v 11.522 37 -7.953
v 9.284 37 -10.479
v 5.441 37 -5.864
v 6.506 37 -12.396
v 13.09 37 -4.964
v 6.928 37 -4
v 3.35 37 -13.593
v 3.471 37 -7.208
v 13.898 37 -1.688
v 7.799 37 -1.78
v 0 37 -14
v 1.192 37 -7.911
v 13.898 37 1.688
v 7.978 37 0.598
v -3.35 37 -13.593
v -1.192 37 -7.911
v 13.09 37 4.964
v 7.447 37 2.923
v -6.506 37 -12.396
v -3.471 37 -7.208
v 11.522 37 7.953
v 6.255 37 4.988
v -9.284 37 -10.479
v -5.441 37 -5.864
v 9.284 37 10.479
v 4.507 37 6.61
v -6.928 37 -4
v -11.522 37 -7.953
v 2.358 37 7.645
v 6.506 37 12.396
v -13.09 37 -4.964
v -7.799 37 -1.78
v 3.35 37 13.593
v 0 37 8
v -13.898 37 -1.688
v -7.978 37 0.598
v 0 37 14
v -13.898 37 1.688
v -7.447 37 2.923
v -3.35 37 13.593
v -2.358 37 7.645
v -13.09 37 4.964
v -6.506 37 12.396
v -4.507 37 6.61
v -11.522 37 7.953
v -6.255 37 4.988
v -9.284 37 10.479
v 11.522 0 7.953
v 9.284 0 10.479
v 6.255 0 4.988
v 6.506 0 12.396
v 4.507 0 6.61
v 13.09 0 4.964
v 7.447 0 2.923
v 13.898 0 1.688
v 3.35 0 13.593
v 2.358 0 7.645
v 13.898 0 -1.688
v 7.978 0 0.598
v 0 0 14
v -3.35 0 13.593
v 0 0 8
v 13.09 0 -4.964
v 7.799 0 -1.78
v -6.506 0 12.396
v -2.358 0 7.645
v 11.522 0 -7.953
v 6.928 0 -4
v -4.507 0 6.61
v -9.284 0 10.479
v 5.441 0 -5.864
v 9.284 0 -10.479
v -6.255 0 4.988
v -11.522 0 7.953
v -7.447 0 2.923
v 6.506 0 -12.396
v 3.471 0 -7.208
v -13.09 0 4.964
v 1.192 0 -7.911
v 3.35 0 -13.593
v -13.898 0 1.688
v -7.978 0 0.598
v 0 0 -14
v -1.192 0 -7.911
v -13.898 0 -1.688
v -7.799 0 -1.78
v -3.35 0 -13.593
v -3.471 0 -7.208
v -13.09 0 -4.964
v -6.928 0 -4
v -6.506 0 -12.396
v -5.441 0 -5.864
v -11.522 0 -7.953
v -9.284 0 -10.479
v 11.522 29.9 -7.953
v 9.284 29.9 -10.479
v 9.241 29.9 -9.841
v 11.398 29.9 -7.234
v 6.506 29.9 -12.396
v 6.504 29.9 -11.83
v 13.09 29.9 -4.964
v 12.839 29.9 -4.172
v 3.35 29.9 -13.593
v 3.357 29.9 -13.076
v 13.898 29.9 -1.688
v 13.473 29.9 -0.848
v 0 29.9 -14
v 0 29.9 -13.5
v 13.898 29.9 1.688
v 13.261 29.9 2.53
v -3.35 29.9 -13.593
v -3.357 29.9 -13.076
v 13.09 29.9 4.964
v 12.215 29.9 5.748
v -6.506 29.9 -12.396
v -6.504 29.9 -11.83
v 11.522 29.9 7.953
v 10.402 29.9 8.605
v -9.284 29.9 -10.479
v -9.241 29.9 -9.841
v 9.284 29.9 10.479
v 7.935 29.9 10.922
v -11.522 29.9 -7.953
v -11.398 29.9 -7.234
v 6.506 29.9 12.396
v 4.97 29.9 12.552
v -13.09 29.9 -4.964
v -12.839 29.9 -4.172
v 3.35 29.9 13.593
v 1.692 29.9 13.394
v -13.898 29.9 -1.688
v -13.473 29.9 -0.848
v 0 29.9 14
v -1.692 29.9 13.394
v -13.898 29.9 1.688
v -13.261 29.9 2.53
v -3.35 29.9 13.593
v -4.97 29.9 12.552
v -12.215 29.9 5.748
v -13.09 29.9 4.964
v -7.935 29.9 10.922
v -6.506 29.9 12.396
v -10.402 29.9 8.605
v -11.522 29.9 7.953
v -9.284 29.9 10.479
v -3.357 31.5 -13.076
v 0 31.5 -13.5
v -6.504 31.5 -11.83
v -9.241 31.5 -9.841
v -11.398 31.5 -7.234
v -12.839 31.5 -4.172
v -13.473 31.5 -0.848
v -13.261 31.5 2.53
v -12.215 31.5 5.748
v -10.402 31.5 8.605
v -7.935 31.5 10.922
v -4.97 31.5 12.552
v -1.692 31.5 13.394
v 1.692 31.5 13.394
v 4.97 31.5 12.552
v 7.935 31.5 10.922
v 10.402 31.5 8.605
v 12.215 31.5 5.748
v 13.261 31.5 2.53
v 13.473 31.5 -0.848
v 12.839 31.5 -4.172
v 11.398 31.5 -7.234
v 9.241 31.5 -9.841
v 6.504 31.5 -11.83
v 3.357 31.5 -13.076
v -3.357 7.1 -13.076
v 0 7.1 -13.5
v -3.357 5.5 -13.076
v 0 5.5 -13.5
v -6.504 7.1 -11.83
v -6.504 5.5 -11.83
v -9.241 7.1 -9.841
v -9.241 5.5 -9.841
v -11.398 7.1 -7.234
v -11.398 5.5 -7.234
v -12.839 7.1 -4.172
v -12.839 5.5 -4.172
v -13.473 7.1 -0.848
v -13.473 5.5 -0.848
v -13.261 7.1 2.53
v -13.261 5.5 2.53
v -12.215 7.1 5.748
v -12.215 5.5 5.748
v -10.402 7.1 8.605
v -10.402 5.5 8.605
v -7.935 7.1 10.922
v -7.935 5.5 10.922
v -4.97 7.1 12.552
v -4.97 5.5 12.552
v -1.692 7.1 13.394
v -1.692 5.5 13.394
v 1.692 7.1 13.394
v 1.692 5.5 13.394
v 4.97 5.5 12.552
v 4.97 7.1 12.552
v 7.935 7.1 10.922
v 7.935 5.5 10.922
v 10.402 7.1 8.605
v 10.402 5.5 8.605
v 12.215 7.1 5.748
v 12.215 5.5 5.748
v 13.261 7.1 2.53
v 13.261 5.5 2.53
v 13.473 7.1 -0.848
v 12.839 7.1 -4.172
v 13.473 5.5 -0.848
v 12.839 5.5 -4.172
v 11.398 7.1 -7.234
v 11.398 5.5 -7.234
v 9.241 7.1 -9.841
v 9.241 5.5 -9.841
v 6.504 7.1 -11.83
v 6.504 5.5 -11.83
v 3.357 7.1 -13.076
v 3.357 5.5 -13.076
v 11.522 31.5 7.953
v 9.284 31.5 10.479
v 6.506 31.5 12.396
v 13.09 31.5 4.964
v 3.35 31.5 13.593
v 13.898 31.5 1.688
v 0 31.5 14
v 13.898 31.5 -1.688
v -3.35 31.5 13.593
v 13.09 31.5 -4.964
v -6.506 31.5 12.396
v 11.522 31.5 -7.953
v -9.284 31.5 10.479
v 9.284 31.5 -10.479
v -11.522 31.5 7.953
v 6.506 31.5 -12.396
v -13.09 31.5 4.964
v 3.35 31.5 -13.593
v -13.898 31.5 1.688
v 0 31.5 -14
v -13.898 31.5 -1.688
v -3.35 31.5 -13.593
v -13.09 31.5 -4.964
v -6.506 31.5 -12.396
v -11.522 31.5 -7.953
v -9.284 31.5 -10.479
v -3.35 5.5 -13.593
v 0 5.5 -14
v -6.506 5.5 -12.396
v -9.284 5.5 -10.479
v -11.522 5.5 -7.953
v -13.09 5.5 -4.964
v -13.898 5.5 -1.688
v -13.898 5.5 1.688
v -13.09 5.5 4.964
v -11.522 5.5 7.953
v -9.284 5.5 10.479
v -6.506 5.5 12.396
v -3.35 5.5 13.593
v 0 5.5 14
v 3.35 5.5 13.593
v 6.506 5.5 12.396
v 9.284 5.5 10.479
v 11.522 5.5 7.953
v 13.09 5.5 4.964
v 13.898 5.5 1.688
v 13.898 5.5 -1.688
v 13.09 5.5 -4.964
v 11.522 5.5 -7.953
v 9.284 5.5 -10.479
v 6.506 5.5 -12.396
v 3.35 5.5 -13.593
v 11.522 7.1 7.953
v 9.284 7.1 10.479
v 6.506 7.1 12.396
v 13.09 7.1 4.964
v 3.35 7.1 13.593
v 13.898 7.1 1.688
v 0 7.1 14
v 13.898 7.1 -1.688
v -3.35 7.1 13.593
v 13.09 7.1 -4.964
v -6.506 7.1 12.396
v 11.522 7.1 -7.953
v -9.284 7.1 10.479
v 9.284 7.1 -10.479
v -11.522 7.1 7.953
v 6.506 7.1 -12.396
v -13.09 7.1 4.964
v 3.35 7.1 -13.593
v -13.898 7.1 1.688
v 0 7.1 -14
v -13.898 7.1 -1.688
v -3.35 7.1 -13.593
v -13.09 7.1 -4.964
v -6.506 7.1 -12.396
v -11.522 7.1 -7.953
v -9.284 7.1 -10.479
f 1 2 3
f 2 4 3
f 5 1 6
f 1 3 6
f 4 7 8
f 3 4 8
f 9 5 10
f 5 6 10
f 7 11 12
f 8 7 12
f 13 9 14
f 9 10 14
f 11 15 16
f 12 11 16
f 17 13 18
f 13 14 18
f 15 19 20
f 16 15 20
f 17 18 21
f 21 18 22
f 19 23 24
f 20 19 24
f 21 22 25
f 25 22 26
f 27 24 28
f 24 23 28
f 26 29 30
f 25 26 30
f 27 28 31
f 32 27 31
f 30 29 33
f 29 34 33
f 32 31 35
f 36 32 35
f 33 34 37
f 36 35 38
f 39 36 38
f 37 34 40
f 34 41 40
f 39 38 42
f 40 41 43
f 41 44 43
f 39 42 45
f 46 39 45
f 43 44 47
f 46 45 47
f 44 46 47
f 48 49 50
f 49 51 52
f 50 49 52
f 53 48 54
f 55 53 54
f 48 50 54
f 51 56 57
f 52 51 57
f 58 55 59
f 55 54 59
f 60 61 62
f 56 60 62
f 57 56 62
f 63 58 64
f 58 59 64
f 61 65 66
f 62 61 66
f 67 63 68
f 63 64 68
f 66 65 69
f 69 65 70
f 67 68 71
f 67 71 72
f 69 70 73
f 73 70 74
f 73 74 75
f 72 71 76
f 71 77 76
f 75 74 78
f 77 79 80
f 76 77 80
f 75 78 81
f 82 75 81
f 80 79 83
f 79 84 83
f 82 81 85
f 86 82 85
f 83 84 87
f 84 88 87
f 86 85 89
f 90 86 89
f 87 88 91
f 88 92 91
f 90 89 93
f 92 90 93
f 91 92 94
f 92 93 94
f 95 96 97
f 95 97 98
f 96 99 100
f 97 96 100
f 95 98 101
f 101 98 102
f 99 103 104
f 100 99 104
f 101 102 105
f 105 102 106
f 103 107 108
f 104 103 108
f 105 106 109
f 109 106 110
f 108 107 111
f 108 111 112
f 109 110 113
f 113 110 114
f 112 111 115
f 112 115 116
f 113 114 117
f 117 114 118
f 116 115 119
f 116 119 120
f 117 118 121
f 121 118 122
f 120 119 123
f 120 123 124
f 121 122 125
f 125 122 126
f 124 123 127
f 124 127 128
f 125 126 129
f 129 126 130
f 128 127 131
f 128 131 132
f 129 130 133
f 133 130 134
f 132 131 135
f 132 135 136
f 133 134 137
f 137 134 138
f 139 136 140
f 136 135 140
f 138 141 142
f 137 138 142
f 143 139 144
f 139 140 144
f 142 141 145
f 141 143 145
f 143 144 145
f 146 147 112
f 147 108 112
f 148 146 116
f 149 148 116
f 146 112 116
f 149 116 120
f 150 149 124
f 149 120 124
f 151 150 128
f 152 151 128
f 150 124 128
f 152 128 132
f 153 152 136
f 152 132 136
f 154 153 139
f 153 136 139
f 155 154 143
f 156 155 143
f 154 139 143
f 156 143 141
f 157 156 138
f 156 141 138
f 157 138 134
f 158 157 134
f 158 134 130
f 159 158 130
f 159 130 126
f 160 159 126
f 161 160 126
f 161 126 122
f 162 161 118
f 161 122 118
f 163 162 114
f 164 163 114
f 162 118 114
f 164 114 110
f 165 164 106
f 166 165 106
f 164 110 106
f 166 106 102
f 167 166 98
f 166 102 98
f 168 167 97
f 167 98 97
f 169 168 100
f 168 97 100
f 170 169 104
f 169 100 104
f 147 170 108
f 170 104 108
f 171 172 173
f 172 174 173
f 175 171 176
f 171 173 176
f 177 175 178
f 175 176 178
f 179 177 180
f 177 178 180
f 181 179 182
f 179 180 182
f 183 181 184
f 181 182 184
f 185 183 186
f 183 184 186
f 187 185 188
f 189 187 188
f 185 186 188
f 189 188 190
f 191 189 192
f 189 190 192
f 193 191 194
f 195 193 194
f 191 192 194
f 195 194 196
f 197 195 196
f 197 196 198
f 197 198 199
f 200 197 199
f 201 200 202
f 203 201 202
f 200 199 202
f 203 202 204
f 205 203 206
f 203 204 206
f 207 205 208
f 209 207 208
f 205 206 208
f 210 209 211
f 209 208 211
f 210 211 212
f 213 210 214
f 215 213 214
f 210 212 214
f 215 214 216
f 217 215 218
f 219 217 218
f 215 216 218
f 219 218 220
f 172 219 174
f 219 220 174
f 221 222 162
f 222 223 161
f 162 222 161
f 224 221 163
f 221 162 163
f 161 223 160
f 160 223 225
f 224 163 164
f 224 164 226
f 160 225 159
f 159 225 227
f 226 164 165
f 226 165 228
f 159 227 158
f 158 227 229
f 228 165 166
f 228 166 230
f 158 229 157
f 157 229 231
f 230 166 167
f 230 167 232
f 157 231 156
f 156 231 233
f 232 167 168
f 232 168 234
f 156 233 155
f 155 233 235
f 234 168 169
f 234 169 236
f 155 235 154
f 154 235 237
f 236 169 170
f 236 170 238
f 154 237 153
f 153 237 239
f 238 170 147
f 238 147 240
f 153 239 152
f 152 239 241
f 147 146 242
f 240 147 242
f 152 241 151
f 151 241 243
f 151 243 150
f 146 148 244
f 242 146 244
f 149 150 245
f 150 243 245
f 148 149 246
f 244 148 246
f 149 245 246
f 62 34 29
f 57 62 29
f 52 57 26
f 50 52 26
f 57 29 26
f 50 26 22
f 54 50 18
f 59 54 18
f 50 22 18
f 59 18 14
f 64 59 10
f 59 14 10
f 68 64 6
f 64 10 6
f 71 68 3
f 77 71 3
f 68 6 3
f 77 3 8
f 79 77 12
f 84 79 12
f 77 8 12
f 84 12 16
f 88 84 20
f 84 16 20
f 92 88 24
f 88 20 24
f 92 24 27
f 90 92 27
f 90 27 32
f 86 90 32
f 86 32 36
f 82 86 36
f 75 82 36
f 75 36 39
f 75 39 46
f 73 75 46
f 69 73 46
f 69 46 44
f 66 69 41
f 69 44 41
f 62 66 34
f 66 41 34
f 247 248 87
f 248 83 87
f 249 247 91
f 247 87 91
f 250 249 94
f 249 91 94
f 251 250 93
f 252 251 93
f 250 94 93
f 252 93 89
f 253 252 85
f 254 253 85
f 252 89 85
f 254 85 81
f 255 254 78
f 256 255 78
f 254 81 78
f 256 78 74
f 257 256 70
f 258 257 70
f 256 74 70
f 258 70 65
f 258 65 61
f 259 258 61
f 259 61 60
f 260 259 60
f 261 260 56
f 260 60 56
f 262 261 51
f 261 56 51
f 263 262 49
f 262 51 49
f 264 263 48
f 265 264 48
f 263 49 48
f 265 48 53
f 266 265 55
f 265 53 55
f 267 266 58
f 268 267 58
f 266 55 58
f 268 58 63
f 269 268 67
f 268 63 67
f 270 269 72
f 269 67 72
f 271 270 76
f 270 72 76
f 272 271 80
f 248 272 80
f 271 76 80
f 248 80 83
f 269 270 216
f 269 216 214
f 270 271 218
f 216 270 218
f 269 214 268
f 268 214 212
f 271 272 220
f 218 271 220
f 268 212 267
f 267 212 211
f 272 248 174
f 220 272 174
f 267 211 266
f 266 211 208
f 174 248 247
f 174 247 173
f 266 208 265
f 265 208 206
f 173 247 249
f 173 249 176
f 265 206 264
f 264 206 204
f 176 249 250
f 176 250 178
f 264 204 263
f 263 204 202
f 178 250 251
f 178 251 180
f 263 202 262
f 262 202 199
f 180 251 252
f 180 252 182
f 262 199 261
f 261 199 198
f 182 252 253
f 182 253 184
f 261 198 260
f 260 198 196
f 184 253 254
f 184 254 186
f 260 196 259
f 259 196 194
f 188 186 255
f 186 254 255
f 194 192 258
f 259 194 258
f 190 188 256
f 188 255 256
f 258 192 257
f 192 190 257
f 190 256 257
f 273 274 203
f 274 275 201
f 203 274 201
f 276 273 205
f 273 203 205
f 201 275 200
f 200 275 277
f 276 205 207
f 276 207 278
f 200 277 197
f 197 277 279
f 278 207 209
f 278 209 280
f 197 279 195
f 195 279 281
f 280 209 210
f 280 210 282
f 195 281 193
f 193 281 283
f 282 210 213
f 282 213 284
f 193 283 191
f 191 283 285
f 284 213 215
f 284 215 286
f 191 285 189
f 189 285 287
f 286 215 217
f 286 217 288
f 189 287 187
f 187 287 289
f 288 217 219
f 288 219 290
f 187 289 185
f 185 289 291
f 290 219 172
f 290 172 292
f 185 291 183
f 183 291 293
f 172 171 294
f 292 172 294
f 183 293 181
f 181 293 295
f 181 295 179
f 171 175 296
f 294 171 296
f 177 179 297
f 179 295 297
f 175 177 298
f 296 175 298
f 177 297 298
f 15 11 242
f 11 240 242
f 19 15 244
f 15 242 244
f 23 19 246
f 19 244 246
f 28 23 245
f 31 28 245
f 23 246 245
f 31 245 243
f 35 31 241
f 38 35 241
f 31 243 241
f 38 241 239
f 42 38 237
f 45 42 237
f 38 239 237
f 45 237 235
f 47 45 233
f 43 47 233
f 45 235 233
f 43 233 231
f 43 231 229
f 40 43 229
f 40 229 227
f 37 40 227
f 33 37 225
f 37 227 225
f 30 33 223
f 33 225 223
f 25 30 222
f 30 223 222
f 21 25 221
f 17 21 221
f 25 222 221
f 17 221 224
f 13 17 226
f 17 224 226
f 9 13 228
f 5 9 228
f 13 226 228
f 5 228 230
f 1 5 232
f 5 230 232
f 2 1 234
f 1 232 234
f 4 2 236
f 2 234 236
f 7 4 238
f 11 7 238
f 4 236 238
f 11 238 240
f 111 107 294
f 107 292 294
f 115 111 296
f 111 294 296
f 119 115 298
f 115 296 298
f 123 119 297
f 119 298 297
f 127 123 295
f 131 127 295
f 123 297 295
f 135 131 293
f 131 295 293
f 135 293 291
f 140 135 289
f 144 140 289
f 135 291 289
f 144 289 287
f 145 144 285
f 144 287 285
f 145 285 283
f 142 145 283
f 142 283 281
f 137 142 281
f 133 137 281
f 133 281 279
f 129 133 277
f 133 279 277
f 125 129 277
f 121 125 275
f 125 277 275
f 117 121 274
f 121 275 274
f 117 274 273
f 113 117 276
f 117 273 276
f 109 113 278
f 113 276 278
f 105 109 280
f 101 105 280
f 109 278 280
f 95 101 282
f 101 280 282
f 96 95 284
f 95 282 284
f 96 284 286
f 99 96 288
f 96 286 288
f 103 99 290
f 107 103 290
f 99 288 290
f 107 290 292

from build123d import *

# Parameters (mm, degrees)
SKETCH_3_R          = 8
CUT_EXTRUDE_1_DEPTH = 37


with BuildPart() as part:
    # Эскиз2 → Повернуть1 (revolve)
    with BuildSketch(Plane.XY, mode=Mode.PRIVATE) as revolve_1_sk:
        Polygon((13.5, 5.5), (14, 5.5), (14, 0), (0, 0), (0, 37), (14, 37), (14, 31.5), (13.5, 31.5), (13.5, 29.9), (14, 29.9), (14, 7.1), (13.5, 7.1), align=None)
    revolve(revolve_1_sk.sketch.rotate(Axis((0, 0, 0), (0, 1, 0)), 90), axis=Axis((0, 0, 0), (0, 1, 0)))

    # Эскиз3 → Вырез-Вытянуть1 (cut)
    with BuildSketch(Plane(origin=(0, 37, 0), x_dir=(1, 0, 0), z_dir=(0, 1, 0))):
        with Locations(Location((0, 0, 0), (0, 0, 270))):
            Circle(SKETCH_3_R)
    extrude(amount=-CUT_EXTRUDE_1_DEPTH, mode=Mode.SUBTRACT)


solid = part.part
